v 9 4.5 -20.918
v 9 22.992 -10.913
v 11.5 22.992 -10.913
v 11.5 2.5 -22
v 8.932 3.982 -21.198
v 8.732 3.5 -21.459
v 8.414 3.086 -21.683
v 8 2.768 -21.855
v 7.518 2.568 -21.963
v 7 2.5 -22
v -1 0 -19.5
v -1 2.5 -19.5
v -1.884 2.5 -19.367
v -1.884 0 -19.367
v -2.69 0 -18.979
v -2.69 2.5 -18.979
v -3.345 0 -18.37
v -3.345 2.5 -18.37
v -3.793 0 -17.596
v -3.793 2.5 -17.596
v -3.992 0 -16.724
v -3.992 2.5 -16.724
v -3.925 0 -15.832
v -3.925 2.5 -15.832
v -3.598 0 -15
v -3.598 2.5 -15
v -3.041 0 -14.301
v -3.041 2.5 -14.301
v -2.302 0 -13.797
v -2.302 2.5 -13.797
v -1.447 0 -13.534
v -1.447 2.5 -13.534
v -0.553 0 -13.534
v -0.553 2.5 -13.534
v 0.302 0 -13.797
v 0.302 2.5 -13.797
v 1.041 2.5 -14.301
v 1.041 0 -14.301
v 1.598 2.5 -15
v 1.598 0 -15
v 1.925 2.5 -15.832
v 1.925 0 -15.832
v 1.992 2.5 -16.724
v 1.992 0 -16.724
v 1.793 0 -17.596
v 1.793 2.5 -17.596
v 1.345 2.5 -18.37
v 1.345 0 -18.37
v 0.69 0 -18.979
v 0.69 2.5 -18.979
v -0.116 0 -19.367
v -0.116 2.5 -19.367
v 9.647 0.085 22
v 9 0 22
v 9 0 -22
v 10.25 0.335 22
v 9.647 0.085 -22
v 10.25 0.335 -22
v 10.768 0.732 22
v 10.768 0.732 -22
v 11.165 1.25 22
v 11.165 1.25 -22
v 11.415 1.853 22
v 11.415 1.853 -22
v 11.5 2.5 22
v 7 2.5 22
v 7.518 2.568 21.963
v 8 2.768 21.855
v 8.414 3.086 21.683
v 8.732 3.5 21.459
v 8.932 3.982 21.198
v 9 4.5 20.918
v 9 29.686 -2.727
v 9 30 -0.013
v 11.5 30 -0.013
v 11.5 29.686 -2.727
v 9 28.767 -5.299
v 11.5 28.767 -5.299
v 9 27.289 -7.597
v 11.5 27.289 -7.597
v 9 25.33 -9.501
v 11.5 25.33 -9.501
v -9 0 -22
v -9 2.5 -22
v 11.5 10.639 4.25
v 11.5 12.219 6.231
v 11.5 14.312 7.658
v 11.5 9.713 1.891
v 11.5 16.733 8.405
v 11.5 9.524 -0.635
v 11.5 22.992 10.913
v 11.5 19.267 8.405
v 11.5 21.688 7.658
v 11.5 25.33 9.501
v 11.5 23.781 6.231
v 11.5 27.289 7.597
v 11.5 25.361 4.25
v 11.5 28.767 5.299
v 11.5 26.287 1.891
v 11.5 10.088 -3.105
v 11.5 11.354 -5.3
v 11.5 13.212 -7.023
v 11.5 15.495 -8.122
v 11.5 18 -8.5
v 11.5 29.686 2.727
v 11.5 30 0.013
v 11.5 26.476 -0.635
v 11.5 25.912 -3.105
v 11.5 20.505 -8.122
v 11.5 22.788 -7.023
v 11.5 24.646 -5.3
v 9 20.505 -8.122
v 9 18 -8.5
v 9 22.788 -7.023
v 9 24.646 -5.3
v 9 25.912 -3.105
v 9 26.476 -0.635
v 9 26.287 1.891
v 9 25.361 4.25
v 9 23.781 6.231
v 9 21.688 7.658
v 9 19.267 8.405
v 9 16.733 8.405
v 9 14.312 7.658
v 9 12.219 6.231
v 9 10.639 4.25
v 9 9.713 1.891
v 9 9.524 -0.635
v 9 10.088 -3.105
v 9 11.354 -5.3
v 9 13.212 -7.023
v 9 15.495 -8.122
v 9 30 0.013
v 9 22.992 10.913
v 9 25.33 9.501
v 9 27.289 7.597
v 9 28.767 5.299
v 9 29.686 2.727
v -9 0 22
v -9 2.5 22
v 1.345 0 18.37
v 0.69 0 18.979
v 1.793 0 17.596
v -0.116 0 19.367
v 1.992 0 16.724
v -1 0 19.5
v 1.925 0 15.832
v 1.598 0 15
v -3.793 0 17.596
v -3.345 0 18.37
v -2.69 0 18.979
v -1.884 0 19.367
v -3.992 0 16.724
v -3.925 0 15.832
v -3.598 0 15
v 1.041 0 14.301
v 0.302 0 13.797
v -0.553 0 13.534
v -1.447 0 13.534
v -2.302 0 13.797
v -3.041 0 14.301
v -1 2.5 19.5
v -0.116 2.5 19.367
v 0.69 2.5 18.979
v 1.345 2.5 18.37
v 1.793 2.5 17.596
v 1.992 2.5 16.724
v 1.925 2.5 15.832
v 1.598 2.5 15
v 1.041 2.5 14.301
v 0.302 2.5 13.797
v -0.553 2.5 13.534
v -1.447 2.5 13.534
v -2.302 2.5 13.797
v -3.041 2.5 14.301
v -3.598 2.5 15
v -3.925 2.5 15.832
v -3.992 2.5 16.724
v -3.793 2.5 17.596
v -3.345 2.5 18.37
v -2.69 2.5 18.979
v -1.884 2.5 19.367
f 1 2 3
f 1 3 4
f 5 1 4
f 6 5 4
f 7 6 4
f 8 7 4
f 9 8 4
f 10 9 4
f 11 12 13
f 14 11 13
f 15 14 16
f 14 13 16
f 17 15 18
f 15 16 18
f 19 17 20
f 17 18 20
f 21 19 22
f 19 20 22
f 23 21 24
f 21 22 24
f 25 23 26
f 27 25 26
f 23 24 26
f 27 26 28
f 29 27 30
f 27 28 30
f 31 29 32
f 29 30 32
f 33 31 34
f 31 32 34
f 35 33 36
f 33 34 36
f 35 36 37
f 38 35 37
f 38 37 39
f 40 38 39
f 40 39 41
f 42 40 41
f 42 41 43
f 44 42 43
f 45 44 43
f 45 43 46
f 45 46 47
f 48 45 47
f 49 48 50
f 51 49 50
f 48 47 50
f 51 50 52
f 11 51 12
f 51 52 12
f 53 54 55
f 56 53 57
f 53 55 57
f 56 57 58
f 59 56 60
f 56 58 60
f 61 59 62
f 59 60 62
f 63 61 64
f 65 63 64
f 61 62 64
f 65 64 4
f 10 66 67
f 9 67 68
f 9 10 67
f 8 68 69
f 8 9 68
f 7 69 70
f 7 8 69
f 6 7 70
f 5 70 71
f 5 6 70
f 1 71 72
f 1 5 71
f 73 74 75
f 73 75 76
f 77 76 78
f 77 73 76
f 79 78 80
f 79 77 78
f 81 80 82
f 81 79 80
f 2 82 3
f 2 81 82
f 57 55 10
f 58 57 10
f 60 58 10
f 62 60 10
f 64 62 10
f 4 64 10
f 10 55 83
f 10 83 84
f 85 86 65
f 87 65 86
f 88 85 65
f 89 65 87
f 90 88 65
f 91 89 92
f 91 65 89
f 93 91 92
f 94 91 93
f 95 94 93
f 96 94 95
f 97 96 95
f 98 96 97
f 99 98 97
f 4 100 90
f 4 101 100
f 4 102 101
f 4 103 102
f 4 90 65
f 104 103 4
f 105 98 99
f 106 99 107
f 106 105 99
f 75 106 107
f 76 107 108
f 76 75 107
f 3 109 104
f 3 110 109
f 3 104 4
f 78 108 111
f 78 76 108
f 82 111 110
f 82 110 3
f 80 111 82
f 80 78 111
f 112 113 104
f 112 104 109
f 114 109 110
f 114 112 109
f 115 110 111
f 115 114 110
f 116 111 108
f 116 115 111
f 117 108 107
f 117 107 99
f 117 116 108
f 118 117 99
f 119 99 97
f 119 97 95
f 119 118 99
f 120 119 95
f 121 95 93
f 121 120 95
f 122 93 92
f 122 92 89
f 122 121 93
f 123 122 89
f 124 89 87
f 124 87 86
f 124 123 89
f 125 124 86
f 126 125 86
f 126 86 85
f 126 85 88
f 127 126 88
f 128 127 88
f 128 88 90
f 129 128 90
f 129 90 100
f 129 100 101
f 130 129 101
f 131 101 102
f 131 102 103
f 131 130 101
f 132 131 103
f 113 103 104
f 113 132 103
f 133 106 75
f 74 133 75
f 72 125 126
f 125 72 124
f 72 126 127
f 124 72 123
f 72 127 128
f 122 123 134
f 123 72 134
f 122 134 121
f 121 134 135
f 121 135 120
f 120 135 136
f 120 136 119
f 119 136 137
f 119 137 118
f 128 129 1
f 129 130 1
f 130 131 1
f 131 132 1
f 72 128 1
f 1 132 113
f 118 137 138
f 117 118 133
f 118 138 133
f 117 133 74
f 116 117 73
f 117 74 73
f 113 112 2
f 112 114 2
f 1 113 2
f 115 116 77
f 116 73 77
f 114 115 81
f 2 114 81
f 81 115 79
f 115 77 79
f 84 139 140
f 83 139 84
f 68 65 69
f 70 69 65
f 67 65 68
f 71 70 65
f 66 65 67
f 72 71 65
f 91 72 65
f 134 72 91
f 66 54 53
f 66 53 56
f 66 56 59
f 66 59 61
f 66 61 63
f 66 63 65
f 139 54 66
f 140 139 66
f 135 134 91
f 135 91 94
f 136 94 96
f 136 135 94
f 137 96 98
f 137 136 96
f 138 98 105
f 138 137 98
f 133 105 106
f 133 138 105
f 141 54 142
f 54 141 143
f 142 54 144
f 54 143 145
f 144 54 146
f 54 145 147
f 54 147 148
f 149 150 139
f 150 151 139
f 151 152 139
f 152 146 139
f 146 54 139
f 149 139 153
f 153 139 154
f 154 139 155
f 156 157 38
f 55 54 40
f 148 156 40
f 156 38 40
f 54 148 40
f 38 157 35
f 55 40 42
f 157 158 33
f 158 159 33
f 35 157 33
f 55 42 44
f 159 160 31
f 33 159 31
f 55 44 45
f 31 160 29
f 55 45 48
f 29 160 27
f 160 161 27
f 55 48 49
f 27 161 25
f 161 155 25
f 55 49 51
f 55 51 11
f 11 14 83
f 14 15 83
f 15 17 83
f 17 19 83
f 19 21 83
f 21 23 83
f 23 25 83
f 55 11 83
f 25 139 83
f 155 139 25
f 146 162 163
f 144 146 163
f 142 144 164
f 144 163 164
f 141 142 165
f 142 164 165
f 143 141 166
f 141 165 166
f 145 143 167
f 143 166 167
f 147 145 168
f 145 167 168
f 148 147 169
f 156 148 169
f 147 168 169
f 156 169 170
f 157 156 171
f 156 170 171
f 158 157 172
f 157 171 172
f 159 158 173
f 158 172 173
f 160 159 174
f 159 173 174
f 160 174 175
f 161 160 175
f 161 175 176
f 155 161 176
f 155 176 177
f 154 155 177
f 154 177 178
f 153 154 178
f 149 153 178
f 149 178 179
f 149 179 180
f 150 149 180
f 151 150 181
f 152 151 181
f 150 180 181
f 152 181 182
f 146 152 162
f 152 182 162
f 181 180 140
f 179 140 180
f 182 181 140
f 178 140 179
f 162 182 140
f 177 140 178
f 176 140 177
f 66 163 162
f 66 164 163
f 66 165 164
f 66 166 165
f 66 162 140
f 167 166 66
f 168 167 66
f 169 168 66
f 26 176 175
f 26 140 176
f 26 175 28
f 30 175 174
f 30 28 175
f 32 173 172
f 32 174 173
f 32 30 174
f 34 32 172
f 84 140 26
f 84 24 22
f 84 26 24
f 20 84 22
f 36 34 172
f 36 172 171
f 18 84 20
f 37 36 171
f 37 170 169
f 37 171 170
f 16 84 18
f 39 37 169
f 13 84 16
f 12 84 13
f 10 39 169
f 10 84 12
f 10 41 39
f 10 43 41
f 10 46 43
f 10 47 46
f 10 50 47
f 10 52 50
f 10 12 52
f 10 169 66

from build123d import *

# Parameters (mm, degrees)
SKETCH1_W              = 18
SKETCH1_H              = 44
BOSS_EXTRUDE1_DEPTH    = 2.5
SKETCH2_R              = 3
CUT_EXTRUDE1_DEPTH     = 2.5
SKETCH3_W              = 44
SKETCH3_H              = 30
BOSS_EXTRUDE2_DEPTH    = 2.5
CUT_EXTRUDE2_START     = -2.5
CUT_EXTRUDE2_OUTLINE_R = 8.5
CUT_EXTRUDE2_DEPTH     = 2.5
FILLET7_R              = 2.5
FILLET8_R              = 2


# Read off the part's stored shape, not the designer's step: Cut-Extrude2
with BuildPart() as part:
    # Sketch1 → Boss-Extrude1 (new body)
    with BuildSketch(Plane(origin=(0, 0, 0), x_dir=(1, 0, 0), z_dir=(0, 1, 0))):
        Rectangle(SKETCH1_W, SKETCH1_H)
    extrude(amount=BOSS_EXTRUDE1_DEPTH)

    # Sketch2 → Cut-Extrude1 (cut)
    with BuildSketch(Plane(origin=(0, 2.5, 0), x_dir=(1, 0, 0), z_dir=(0, 1, 0))):
        with Locations(Location((-1, -16.5, 0), (0, 0, 270))):
            Circle(SKETCH2_R)
        with Locations(Location((-1, 16.5, 0), (0, 0, 90))):
            Circle(SKETCH2_R)
    extrude(amount=-CUT_EXTRUDE1_DEPTH, mode=Mode.SUBTRACT)

    # Sketch3 → Boss-Extrude2 (add)
    with BuildSketch(Plane(origin=(9, 0, 0), x_dir=(0, 0, -1), z_dir=(1, 0, 0))):
        with Locations((0, 15)):
            Rectangle(SKETCH3_W, SKETCH3_H)
    extrude(amount=BOSS_EXTRUDE2_DEPTH)

    # Cut-Extrude2 outline → Cut-Extrude2 (cut)
    with BuildSketch(Plane(origin=(11.5, 0, 0), x_dir=(0, 0, -1), z_dir=(1, 0, 0)).offset(CUT_EXTRUDE2_START)):
        with BuildLine():
            ThreePointArc((-10.912541818, 22.991653356), (-6.484608549, 28.09703046), (0, 30.000007173))
            Line((0, 30.000007173), (-22, 30))
            Line((-22, 30), (-22, 2.5))
            Line((-22, 2.5), (-10.912541818, 22.991653356))
        make_face()
        with BuildLine():
            ThreePointArc((0, 30.000007173), (6.484608549, 28.09703046), (10.912541818, 22.991653356))
            Line((10.912541818, 22.991653356), (22, 2.5))
            Line((22, 2.5), (22, 30))
            Line((22, 30), (0, 30.000007173))
        make_face()
        with Locations((0, 18)):
            Circle(CUT_EXTRUDE2_OUTLINE_R)
    extrude(amount=CUT_EXTRUDE2_DEPTH, mode=Mode.SUBTRACT)

    # Fillet7
    fillet7_edges = [part.edges().sort_by_distance(p)[0] for p in [
        (11.5, 0, 0),
    ]]
    fillet(fillet7_edges, radius=FILLET7_R)

    # Fillet8
    fillet8_edges = [part.edges().sort_by_distance(p)[0] for p in [
        (9, 2.5, 0),
    ]]
    fillet(fillet8_edges, radius=FILLET8_R)


solid = part.part
